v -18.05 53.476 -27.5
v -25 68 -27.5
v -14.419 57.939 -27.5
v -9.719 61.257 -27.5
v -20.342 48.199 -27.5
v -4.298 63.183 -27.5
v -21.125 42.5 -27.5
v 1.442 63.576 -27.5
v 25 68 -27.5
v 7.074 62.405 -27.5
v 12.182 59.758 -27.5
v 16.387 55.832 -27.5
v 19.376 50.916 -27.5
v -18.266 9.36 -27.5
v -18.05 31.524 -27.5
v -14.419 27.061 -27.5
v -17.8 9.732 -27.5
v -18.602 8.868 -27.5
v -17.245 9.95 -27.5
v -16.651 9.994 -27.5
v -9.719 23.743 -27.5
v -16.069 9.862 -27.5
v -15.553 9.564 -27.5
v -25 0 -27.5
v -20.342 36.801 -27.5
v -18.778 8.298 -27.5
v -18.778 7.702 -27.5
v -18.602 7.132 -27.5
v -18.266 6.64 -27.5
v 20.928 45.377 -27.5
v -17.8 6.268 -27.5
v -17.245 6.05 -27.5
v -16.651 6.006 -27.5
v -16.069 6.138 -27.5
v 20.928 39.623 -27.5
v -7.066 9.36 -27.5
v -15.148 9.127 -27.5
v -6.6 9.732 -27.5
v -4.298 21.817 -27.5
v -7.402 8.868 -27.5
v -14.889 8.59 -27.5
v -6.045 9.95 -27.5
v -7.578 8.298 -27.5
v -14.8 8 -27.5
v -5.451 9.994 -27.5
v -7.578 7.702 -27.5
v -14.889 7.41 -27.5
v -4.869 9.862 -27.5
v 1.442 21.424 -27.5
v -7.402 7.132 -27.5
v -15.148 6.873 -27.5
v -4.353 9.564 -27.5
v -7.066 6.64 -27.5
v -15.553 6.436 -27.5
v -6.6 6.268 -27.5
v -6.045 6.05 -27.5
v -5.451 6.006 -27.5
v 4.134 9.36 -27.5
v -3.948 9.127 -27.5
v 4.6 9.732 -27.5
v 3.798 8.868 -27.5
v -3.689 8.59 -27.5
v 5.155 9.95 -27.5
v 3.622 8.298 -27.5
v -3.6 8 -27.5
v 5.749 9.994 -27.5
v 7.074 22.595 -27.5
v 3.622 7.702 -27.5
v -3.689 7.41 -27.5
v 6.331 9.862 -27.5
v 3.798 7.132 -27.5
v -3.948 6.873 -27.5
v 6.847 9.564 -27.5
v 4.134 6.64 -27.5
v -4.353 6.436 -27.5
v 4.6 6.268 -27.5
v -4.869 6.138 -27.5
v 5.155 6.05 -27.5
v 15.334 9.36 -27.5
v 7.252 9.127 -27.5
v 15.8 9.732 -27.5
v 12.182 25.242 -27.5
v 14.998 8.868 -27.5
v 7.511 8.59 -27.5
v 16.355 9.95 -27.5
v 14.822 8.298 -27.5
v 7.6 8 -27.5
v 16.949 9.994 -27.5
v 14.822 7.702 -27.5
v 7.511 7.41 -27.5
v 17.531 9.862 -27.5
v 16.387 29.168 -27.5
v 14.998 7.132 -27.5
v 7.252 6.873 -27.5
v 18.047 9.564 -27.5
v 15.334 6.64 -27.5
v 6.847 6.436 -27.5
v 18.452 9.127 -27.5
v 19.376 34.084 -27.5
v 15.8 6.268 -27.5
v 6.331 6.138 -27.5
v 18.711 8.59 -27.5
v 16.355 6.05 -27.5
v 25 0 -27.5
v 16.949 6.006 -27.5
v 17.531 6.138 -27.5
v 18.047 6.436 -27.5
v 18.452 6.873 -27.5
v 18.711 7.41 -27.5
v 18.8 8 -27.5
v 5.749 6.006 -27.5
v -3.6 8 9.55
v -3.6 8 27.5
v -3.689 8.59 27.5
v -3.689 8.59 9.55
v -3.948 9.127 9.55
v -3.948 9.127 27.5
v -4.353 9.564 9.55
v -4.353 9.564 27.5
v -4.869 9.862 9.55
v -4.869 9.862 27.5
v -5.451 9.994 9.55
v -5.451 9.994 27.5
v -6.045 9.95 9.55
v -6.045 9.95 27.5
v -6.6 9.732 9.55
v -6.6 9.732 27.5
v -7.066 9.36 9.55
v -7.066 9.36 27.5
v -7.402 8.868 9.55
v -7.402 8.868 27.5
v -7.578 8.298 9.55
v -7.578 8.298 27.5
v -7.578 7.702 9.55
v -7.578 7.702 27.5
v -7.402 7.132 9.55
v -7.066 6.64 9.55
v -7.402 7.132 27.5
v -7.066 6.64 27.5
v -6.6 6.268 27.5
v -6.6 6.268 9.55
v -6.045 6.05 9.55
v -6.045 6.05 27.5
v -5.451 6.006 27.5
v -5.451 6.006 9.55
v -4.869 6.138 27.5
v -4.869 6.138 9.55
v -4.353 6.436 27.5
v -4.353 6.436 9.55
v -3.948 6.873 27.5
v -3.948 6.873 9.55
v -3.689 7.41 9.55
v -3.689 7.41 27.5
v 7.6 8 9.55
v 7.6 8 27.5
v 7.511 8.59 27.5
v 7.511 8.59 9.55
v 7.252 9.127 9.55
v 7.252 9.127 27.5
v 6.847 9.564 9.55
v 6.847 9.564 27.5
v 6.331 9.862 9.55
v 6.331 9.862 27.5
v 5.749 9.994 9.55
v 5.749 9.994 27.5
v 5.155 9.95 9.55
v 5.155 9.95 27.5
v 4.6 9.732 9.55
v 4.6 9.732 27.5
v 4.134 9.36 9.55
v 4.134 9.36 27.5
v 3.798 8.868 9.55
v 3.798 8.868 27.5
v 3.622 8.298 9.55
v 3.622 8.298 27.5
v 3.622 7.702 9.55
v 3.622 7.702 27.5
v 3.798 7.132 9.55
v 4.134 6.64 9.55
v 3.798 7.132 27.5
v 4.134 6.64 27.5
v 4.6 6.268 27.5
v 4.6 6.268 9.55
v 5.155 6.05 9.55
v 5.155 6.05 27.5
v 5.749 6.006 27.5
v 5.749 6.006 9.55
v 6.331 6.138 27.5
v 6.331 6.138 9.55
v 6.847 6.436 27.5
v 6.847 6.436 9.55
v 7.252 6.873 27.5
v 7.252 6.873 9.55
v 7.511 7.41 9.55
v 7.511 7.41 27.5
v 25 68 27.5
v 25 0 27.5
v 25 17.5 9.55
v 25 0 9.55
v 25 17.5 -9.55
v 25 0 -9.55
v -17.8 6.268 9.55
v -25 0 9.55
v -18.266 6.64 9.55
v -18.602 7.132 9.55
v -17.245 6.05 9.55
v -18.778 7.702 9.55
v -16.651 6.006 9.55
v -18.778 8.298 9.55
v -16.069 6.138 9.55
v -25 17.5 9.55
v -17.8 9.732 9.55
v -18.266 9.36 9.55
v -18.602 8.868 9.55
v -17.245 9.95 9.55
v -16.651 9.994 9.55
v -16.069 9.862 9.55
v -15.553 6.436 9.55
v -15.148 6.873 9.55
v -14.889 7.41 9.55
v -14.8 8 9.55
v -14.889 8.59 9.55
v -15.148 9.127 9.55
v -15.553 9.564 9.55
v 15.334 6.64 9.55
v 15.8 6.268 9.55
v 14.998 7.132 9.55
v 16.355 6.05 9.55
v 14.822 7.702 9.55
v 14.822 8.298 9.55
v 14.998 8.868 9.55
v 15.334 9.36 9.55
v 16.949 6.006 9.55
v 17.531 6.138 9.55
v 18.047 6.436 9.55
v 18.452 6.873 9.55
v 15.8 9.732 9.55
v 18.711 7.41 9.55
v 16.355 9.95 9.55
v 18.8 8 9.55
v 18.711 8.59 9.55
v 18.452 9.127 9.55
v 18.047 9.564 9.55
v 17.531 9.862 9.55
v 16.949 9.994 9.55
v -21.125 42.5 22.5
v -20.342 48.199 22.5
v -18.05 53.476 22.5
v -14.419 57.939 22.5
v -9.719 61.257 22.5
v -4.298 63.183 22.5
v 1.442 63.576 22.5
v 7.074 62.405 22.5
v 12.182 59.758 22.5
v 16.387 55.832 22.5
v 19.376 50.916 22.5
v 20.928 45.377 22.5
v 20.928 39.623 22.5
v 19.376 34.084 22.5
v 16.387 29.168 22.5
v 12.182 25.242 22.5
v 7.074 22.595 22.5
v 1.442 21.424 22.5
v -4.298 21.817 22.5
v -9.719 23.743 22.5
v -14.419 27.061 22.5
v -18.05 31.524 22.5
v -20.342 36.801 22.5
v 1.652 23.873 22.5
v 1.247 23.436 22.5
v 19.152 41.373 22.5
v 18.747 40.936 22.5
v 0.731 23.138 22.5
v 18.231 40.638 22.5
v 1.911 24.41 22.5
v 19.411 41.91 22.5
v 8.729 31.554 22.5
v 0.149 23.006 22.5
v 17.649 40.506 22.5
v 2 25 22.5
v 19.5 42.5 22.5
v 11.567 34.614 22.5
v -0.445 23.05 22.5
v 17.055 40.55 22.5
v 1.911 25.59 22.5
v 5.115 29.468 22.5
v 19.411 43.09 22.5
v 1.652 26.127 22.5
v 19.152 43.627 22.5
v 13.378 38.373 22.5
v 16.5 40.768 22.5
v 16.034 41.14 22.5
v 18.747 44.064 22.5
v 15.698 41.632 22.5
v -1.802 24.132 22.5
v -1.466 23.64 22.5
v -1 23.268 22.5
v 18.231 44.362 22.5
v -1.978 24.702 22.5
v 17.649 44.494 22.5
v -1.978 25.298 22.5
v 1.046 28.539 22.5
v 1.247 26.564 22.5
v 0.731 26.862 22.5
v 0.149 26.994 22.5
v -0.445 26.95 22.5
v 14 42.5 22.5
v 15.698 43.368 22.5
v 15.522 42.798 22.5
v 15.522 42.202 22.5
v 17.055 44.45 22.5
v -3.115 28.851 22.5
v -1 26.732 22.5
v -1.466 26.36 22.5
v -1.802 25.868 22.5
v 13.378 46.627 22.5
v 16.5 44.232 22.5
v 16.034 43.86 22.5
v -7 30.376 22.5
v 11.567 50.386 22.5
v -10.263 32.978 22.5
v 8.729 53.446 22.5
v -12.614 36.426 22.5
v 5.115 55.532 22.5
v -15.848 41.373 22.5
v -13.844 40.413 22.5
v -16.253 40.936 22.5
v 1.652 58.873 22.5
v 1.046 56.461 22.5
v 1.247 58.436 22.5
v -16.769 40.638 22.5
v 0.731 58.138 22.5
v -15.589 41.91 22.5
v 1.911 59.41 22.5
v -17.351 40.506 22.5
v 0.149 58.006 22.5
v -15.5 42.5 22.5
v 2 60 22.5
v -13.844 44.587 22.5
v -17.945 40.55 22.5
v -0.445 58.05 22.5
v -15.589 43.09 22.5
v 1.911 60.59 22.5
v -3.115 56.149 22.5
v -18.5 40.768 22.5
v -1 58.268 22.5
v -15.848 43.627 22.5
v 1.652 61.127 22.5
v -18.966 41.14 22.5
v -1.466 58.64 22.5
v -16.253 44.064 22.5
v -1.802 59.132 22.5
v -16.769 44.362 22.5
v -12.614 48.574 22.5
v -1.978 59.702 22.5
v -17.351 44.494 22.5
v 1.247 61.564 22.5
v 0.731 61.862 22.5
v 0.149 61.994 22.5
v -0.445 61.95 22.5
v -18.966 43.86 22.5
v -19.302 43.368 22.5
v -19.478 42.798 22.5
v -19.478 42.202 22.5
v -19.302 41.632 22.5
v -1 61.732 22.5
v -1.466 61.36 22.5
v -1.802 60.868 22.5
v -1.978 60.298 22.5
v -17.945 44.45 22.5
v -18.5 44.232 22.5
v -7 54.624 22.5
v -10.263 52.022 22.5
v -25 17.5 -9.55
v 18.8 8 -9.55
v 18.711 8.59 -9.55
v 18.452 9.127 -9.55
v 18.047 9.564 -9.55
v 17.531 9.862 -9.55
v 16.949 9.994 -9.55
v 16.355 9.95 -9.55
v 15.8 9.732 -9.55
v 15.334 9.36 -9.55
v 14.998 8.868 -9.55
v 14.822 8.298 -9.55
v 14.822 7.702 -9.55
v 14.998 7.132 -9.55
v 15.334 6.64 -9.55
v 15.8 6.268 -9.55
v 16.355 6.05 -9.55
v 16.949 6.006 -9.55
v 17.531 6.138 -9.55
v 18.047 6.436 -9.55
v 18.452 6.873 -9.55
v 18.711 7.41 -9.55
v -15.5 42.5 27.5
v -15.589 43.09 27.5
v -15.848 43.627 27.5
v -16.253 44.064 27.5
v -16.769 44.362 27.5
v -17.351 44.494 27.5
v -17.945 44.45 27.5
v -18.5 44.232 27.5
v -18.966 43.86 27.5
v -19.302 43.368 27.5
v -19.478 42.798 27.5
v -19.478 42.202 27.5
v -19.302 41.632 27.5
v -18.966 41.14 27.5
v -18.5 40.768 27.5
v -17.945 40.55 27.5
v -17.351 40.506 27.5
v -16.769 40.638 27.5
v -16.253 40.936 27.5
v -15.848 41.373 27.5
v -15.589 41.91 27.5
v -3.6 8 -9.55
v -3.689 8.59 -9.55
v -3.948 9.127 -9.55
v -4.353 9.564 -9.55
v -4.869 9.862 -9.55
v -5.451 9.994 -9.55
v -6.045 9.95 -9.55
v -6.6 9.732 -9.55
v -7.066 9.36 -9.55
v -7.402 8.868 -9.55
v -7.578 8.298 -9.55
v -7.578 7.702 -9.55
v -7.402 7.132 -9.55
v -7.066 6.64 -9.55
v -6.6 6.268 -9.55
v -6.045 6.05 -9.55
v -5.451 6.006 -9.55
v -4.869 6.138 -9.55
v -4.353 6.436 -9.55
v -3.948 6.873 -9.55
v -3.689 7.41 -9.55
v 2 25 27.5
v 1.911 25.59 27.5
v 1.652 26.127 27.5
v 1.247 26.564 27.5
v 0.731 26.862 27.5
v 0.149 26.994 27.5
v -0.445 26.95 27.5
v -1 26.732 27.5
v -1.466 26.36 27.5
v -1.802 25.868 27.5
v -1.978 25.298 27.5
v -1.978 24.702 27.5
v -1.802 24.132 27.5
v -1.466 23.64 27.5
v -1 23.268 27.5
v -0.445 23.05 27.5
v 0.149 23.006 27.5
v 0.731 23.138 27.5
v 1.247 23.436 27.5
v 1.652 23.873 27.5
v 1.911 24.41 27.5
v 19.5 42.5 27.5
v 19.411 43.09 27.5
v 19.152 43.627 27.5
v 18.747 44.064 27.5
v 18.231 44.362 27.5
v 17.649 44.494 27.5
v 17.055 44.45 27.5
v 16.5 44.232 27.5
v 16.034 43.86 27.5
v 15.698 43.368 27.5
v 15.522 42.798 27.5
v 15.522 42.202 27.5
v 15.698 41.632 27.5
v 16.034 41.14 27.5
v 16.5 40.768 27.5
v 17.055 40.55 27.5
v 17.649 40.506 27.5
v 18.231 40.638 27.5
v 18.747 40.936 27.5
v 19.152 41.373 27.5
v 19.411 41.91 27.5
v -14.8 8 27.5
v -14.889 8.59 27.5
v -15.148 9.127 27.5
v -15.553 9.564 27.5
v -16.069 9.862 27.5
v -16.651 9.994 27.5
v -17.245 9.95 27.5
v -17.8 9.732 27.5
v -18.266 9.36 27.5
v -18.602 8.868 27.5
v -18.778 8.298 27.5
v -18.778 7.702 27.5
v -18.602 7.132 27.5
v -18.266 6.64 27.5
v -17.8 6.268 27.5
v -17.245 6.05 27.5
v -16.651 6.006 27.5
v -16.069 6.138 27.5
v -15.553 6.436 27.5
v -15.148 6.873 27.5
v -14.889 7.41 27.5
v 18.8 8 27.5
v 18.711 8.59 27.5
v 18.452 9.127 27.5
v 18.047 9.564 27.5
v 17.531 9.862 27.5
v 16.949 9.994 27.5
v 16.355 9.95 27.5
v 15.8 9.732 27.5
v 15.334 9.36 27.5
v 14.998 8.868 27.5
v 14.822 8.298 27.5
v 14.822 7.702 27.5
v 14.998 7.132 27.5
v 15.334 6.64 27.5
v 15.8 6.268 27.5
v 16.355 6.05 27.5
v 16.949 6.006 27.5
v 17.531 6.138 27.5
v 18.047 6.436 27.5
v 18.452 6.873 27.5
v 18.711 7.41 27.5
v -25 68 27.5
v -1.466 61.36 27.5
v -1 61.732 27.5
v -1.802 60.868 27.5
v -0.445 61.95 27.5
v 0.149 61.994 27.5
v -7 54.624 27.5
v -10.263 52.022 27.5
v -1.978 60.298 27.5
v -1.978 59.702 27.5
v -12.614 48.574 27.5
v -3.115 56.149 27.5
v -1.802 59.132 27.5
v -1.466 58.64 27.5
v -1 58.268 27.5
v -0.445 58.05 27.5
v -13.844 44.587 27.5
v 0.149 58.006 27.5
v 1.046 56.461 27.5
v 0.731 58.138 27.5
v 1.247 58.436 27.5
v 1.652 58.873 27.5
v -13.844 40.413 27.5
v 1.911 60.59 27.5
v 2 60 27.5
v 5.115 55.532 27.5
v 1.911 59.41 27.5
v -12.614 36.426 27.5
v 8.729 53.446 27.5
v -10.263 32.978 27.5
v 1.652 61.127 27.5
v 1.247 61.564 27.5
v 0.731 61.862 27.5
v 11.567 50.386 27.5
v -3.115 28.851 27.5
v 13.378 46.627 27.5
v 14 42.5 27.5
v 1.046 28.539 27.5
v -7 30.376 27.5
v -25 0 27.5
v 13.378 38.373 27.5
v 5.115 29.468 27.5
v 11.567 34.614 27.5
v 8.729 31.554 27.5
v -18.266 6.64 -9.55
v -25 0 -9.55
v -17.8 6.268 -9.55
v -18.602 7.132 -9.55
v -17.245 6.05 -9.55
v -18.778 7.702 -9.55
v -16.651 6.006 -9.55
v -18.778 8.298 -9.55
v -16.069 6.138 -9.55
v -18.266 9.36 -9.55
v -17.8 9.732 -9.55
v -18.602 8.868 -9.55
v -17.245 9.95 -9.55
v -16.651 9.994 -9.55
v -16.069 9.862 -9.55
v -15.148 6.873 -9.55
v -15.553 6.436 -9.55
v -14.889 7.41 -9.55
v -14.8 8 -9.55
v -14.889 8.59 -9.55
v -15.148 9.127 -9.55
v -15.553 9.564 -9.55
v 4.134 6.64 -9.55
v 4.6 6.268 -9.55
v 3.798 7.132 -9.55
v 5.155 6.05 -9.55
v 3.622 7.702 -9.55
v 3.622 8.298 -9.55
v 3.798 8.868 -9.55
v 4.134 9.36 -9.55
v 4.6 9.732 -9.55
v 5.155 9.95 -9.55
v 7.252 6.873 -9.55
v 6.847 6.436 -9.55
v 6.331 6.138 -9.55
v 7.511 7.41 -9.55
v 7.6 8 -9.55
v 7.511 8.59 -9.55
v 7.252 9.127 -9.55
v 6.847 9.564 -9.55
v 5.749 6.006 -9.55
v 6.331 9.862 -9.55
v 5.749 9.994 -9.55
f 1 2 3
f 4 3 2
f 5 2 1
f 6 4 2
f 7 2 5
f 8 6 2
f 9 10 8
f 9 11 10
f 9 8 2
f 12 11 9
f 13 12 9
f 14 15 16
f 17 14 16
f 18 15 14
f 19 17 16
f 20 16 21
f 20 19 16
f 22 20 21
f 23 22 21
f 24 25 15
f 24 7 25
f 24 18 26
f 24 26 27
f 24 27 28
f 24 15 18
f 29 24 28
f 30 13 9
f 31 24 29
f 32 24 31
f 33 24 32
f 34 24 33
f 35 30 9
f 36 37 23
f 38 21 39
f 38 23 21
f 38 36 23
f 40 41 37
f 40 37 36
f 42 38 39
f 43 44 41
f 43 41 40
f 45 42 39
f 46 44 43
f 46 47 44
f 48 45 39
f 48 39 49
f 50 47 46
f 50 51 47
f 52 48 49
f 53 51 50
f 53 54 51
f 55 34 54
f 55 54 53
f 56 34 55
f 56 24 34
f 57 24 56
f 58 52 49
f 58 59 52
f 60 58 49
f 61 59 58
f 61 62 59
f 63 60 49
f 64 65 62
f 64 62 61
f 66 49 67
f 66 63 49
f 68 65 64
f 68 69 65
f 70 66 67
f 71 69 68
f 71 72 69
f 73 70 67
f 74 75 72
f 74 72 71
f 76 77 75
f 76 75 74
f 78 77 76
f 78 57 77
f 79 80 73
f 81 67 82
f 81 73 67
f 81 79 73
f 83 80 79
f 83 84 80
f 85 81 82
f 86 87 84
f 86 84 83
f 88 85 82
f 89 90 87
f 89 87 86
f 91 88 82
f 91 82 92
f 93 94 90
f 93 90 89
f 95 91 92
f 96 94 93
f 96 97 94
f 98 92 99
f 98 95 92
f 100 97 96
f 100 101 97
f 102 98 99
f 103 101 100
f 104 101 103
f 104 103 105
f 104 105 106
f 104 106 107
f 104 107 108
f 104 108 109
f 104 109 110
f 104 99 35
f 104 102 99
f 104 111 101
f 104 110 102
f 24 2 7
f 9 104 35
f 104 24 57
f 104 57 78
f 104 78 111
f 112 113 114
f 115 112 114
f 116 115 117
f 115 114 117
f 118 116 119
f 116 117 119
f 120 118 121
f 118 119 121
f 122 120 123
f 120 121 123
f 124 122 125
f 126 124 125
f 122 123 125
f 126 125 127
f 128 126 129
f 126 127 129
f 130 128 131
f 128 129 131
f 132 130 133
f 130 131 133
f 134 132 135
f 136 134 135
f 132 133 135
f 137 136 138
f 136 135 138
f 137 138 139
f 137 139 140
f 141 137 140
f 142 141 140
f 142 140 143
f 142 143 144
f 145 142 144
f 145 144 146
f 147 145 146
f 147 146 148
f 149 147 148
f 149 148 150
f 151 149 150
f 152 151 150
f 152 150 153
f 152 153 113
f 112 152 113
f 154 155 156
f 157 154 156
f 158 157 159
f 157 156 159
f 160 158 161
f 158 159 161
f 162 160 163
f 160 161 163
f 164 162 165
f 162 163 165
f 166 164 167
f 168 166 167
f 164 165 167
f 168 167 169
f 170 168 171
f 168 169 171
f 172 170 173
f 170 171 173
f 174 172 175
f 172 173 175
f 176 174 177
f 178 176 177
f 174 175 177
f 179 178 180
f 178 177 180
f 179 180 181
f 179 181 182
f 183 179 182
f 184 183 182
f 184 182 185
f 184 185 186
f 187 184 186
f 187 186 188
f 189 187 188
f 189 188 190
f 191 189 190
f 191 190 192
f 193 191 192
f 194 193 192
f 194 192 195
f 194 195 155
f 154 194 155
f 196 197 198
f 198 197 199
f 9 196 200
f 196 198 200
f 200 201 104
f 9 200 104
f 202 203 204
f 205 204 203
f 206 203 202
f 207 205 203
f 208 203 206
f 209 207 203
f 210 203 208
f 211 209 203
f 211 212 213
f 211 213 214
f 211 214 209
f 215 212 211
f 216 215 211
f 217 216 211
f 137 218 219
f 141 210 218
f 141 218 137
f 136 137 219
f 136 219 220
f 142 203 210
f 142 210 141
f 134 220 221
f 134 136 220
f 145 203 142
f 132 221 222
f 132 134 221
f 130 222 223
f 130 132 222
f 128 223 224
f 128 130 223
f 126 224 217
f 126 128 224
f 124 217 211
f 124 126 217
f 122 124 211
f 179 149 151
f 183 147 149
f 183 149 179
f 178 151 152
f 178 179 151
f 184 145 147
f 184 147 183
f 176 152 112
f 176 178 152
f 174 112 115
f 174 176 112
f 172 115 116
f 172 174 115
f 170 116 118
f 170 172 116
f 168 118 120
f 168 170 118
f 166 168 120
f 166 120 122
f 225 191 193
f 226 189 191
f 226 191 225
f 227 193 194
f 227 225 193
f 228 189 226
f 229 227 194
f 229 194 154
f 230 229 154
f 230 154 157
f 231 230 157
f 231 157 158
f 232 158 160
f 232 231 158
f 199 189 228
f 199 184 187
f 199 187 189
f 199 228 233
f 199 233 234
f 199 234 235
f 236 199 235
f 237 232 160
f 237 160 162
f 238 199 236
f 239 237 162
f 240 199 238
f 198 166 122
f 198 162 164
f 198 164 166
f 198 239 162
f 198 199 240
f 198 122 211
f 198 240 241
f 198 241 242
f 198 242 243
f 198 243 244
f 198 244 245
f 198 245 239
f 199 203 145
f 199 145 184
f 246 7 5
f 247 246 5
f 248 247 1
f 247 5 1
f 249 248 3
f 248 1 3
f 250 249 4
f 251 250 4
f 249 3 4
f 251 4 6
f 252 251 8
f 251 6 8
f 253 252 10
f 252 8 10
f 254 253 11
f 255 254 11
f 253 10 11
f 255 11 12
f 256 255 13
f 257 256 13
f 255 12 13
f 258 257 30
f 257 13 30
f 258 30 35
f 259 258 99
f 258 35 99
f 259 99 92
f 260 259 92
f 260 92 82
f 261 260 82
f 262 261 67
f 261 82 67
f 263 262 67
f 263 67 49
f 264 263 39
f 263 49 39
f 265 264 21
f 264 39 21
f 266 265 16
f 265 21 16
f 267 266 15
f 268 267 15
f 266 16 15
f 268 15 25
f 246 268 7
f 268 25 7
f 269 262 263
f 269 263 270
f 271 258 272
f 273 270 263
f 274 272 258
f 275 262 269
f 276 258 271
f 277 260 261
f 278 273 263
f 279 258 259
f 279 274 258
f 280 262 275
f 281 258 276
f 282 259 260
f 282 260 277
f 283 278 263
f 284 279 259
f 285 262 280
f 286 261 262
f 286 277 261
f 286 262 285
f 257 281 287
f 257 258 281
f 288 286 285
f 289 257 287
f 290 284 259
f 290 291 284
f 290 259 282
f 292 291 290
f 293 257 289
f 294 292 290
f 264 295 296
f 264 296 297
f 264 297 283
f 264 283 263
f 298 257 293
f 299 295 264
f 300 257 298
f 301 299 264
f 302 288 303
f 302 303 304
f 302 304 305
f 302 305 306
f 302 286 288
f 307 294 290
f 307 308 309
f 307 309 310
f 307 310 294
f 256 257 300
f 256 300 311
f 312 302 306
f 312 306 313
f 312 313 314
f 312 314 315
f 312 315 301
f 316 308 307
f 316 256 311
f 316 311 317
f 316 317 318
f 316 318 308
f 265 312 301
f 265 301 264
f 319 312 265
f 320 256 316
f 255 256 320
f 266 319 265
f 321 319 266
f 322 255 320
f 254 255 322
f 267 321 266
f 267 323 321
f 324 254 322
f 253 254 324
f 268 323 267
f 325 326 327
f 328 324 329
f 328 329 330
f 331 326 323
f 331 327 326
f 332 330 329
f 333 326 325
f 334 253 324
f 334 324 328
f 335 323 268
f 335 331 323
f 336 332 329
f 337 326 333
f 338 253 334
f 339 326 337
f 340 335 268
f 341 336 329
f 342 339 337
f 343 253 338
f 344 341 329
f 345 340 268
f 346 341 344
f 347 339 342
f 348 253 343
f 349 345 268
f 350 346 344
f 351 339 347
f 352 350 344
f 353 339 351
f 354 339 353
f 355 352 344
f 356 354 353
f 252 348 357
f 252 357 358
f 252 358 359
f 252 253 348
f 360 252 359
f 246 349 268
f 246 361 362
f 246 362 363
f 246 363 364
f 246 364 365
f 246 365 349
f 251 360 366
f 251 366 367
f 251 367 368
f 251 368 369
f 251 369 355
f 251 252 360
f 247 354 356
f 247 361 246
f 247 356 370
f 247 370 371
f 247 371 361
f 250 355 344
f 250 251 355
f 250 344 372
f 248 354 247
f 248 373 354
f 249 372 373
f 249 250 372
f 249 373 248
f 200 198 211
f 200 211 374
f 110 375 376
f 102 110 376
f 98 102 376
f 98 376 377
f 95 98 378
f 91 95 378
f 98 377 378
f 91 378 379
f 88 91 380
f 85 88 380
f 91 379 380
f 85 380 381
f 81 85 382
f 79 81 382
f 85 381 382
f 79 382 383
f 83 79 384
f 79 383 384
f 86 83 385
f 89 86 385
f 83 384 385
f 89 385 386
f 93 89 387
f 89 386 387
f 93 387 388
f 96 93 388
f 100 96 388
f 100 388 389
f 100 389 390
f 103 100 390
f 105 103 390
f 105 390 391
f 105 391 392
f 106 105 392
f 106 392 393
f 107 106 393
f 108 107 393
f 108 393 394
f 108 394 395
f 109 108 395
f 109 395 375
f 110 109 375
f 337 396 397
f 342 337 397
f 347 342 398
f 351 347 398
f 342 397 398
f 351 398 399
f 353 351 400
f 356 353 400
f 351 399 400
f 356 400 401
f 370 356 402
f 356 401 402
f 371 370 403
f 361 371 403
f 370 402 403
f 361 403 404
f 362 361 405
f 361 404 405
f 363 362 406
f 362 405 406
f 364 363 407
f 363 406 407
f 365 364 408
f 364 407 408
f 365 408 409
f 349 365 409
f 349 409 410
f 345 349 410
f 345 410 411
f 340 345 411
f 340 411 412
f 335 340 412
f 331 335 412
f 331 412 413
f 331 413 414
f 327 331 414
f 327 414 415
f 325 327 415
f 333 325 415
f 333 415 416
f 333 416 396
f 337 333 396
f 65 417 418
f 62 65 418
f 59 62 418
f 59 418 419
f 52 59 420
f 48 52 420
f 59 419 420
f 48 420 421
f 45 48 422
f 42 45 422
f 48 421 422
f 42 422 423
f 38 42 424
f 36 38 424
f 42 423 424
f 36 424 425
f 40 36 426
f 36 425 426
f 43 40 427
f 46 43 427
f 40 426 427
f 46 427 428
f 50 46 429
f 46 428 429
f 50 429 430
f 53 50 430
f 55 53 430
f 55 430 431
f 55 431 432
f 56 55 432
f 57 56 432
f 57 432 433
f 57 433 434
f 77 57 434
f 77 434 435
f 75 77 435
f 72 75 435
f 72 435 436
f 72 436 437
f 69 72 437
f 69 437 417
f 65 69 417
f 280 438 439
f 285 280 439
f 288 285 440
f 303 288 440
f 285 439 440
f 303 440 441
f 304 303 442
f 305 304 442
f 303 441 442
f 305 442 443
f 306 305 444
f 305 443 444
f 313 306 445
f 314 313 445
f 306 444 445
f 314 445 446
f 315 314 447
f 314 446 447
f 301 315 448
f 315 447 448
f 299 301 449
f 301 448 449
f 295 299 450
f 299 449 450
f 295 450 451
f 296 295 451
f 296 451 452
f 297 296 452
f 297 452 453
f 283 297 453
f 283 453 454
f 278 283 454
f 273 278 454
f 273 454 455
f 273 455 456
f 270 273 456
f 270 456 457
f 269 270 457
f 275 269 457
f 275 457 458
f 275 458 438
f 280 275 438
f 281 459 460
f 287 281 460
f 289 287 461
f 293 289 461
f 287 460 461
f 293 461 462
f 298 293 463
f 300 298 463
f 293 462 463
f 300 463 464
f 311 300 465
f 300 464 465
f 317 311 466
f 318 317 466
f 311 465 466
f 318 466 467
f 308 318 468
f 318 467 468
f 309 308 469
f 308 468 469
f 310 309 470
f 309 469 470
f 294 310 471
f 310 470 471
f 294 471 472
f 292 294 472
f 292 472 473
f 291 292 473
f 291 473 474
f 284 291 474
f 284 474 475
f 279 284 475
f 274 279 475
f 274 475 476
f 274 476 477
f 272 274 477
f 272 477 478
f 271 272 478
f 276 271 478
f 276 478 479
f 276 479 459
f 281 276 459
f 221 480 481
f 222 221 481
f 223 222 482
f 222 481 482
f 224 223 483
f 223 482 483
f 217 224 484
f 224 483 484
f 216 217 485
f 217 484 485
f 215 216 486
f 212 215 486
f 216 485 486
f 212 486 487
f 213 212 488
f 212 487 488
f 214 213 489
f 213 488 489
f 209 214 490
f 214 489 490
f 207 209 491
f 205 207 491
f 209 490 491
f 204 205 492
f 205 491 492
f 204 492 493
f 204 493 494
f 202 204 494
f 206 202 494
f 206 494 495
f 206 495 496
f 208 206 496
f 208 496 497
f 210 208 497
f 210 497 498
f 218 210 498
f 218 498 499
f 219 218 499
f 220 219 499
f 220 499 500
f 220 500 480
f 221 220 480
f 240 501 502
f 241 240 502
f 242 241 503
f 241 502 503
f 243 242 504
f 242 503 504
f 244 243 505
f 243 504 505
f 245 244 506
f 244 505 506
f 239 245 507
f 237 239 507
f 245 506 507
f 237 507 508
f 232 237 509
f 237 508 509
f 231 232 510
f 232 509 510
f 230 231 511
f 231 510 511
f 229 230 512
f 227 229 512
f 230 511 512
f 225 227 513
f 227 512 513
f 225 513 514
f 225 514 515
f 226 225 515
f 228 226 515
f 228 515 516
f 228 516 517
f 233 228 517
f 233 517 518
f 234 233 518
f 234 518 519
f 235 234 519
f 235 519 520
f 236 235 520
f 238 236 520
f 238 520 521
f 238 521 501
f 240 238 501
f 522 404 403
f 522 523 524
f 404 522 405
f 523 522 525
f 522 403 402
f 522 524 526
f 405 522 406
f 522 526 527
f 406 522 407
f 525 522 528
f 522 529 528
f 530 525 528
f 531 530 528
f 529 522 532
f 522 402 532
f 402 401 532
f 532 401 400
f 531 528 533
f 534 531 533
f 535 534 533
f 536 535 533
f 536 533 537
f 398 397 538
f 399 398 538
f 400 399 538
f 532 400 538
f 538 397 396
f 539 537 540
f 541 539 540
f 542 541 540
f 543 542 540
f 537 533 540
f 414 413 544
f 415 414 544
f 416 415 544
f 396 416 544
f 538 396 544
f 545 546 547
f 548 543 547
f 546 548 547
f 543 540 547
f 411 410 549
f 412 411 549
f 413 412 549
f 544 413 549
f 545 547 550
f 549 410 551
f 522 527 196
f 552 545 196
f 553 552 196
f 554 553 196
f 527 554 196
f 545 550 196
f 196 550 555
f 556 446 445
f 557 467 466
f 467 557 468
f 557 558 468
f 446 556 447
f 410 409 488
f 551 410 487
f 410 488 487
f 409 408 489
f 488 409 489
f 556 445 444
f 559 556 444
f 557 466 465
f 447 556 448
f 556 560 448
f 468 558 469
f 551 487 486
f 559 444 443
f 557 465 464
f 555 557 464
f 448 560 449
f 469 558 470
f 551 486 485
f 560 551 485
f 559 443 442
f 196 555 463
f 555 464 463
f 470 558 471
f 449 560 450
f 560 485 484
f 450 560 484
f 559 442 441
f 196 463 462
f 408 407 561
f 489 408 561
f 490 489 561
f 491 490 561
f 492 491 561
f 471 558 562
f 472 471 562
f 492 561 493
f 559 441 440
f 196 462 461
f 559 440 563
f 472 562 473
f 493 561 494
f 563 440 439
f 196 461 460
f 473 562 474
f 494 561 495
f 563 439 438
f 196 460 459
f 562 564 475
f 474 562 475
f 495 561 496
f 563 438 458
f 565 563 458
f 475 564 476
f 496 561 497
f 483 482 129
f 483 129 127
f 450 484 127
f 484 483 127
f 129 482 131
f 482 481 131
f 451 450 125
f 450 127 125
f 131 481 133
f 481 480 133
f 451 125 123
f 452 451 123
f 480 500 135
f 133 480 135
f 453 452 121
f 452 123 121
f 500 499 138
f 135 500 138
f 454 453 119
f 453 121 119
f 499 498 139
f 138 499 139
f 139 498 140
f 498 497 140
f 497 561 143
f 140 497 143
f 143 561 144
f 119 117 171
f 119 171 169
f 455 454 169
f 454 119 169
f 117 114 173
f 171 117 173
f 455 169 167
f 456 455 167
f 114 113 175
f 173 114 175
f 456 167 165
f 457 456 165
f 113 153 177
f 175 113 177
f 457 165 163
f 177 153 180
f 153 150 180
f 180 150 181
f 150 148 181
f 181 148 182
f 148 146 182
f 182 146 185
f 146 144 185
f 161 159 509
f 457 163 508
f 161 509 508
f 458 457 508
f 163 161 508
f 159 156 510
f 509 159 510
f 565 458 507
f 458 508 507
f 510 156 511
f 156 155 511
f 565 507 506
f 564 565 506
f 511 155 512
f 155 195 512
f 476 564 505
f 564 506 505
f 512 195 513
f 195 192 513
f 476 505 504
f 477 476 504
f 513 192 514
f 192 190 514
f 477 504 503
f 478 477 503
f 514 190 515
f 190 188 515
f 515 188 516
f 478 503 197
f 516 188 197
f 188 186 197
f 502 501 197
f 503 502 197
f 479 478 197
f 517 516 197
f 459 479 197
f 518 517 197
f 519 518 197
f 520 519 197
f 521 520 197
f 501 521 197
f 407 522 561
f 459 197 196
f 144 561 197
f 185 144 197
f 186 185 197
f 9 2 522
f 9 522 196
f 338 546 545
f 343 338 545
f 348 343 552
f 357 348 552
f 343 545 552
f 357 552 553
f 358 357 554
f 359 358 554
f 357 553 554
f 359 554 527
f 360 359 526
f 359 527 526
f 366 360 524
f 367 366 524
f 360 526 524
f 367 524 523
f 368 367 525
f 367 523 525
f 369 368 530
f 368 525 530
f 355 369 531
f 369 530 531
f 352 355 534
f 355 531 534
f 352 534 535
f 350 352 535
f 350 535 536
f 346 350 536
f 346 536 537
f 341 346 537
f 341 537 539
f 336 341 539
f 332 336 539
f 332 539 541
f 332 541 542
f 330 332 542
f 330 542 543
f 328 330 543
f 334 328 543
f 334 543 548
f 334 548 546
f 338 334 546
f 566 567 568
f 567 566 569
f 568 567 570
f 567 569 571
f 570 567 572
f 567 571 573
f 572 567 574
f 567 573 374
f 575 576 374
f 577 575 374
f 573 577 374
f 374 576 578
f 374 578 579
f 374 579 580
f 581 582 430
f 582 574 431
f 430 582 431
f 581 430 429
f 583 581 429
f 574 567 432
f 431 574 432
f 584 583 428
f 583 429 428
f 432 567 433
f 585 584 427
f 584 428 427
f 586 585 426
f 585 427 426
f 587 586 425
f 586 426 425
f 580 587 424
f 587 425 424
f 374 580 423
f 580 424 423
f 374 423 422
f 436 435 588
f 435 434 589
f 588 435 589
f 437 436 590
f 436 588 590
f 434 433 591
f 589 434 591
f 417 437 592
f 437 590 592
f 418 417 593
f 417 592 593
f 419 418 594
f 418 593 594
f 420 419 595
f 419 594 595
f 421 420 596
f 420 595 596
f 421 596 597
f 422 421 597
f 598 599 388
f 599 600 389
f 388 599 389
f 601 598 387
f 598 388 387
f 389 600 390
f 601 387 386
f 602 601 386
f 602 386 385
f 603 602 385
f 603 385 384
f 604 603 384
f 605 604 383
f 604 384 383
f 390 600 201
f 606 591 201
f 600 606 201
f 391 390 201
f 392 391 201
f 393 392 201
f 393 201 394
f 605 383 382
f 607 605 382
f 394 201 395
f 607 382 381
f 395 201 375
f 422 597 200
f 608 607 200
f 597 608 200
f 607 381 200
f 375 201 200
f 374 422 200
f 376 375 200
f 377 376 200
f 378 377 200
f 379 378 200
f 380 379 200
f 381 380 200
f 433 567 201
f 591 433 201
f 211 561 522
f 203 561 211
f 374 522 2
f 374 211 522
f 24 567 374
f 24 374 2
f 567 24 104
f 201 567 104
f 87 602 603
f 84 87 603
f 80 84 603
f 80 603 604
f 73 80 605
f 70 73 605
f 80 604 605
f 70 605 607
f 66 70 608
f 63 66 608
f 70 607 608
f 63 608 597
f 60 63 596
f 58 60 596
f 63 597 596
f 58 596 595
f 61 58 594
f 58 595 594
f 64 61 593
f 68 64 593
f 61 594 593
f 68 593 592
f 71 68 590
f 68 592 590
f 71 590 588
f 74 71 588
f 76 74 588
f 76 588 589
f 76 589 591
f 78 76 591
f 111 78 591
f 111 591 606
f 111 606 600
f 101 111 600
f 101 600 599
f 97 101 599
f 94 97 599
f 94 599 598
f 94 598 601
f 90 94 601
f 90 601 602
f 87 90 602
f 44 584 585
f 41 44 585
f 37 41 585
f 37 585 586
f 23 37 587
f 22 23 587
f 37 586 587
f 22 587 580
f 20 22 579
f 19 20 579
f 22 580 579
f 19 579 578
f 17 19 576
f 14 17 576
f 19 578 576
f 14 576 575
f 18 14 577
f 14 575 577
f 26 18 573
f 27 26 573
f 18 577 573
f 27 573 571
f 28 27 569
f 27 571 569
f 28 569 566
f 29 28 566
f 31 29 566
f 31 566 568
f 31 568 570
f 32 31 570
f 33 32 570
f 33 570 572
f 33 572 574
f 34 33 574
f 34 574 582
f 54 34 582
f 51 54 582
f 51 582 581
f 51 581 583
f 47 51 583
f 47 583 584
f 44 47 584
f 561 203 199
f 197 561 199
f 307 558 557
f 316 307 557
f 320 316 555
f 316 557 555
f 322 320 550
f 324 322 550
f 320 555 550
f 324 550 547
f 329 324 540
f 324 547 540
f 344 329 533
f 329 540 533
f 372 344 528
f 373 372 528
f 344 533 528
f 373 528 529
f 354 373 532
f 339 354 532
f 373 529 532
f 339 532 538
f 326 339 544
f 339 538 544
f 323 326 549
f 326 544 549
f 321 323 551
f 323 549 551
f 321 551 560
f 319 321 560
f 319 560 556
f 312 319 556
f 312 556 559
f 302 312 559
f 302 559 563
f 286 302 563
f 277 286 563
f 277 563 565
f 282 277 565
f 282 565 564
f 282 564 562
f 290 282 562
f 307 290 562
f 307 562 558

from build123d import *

# Parameters (mm, degrees)
SKETCH1_W           = 50
SKETCH1_H           = 55
BOSS_EXTRUDE1_DEPTH = 68
SKETCH3_R           = 21.125
CUT_EXTRUDE1_DEPTH  = 50
SKETCH2_R           = 14
SKETCH2_R_2         = 2
CUT_EXTRUDE2_DEPTH  = 91.96153033
SKETCH4_W           = 19.1
SKETCH4_H           = 17.5
CUT_EXTRUDE3_DEPTH  = 89.770772217
SKETCH5_R           = 2
CUT_EXTRUDE4_DEPTH  = 91.96153033


with BuildPart() as part:
    # Sketch1 → Boss-Extrude1 (new body)
    with BuildSketch(Plane(origin=(0, 0, 0), x_dir=(1, 0, 0), z_dir=(0, 1, 0))):
        Rectangle(SKETCH1_W, SKETCH1_H)
    extrude(amount=BOSS_EXTRUDE1_DEPTH)

    # Sketch3 → Cut-Extrude1 (cut)
    with BuildSketch(Plane(origin=(0, 0, -27.5), x_dir=(-1, 0, 0), z_dir=(0, 0, -1))):
        with Locations((0, 42.5)):
            Circle(SKETCH3_R)
    extrude(amount=-CUT_EXTRUDE1_DEPTH, mode=Mode.SUBTRACT)

    # Sketch2 → Cut-Extrude2 (cut, through all)
    with BuildSketch(Plane.XY.offset(27.5)):
        with Locations((0, 42.5)):
            Circle(SKETCH2_R)
        with Locations((0, 60)):
            Circle(SKETCH2_R_2)
        with Locations((17.5, 42.5)):
            Circle(SKETCH2_R_2)
        with Locations((0, 25)):
            Circle(SKETCH2_R_2)
        with Locations((-17.5, 42.5)):
            Circle(SKETCH2_R_2)
    extrude(amount=-CUT_EXTRUDE2_DEPTH, mode=Mode.SUBTRACT)

    # Sketch4 → Cut-Extrude3 (cut, through all)
    with BuildSketch(Plane(origin=(25, 0, 0), x_dir=(0, 0, -1), z_dir=(1, 0, 0))):
        with Locations((0, 8.75)):
            Rectangle(SKETCH4_W, SKETCH4_H)
    extrude(amount=-CUT_EXTRUDE3_DEPTH, mode=Mode.SUBTRACT)

    # Sketch5 → Cut-Extrude4 (cut, through all)
    with BuildSketch(Plane.XY.offset(27.5)):
        with Locations((-16.8, 8)):
            Circle(SKETCH5_R)
        with Locations((-5.6, 8)):
            Circle(SKETCH5_R)
        with Locations((5.6, 8)):
            Circle(SKETCH5_R)
        with Locations((16.8, 8)):
            Circle(SKETCH5_R)
    extrude(amount=-CUT_EXTRUDE4_DEPTH, mode=Mode.SUBTRACT)


solid = part.part
